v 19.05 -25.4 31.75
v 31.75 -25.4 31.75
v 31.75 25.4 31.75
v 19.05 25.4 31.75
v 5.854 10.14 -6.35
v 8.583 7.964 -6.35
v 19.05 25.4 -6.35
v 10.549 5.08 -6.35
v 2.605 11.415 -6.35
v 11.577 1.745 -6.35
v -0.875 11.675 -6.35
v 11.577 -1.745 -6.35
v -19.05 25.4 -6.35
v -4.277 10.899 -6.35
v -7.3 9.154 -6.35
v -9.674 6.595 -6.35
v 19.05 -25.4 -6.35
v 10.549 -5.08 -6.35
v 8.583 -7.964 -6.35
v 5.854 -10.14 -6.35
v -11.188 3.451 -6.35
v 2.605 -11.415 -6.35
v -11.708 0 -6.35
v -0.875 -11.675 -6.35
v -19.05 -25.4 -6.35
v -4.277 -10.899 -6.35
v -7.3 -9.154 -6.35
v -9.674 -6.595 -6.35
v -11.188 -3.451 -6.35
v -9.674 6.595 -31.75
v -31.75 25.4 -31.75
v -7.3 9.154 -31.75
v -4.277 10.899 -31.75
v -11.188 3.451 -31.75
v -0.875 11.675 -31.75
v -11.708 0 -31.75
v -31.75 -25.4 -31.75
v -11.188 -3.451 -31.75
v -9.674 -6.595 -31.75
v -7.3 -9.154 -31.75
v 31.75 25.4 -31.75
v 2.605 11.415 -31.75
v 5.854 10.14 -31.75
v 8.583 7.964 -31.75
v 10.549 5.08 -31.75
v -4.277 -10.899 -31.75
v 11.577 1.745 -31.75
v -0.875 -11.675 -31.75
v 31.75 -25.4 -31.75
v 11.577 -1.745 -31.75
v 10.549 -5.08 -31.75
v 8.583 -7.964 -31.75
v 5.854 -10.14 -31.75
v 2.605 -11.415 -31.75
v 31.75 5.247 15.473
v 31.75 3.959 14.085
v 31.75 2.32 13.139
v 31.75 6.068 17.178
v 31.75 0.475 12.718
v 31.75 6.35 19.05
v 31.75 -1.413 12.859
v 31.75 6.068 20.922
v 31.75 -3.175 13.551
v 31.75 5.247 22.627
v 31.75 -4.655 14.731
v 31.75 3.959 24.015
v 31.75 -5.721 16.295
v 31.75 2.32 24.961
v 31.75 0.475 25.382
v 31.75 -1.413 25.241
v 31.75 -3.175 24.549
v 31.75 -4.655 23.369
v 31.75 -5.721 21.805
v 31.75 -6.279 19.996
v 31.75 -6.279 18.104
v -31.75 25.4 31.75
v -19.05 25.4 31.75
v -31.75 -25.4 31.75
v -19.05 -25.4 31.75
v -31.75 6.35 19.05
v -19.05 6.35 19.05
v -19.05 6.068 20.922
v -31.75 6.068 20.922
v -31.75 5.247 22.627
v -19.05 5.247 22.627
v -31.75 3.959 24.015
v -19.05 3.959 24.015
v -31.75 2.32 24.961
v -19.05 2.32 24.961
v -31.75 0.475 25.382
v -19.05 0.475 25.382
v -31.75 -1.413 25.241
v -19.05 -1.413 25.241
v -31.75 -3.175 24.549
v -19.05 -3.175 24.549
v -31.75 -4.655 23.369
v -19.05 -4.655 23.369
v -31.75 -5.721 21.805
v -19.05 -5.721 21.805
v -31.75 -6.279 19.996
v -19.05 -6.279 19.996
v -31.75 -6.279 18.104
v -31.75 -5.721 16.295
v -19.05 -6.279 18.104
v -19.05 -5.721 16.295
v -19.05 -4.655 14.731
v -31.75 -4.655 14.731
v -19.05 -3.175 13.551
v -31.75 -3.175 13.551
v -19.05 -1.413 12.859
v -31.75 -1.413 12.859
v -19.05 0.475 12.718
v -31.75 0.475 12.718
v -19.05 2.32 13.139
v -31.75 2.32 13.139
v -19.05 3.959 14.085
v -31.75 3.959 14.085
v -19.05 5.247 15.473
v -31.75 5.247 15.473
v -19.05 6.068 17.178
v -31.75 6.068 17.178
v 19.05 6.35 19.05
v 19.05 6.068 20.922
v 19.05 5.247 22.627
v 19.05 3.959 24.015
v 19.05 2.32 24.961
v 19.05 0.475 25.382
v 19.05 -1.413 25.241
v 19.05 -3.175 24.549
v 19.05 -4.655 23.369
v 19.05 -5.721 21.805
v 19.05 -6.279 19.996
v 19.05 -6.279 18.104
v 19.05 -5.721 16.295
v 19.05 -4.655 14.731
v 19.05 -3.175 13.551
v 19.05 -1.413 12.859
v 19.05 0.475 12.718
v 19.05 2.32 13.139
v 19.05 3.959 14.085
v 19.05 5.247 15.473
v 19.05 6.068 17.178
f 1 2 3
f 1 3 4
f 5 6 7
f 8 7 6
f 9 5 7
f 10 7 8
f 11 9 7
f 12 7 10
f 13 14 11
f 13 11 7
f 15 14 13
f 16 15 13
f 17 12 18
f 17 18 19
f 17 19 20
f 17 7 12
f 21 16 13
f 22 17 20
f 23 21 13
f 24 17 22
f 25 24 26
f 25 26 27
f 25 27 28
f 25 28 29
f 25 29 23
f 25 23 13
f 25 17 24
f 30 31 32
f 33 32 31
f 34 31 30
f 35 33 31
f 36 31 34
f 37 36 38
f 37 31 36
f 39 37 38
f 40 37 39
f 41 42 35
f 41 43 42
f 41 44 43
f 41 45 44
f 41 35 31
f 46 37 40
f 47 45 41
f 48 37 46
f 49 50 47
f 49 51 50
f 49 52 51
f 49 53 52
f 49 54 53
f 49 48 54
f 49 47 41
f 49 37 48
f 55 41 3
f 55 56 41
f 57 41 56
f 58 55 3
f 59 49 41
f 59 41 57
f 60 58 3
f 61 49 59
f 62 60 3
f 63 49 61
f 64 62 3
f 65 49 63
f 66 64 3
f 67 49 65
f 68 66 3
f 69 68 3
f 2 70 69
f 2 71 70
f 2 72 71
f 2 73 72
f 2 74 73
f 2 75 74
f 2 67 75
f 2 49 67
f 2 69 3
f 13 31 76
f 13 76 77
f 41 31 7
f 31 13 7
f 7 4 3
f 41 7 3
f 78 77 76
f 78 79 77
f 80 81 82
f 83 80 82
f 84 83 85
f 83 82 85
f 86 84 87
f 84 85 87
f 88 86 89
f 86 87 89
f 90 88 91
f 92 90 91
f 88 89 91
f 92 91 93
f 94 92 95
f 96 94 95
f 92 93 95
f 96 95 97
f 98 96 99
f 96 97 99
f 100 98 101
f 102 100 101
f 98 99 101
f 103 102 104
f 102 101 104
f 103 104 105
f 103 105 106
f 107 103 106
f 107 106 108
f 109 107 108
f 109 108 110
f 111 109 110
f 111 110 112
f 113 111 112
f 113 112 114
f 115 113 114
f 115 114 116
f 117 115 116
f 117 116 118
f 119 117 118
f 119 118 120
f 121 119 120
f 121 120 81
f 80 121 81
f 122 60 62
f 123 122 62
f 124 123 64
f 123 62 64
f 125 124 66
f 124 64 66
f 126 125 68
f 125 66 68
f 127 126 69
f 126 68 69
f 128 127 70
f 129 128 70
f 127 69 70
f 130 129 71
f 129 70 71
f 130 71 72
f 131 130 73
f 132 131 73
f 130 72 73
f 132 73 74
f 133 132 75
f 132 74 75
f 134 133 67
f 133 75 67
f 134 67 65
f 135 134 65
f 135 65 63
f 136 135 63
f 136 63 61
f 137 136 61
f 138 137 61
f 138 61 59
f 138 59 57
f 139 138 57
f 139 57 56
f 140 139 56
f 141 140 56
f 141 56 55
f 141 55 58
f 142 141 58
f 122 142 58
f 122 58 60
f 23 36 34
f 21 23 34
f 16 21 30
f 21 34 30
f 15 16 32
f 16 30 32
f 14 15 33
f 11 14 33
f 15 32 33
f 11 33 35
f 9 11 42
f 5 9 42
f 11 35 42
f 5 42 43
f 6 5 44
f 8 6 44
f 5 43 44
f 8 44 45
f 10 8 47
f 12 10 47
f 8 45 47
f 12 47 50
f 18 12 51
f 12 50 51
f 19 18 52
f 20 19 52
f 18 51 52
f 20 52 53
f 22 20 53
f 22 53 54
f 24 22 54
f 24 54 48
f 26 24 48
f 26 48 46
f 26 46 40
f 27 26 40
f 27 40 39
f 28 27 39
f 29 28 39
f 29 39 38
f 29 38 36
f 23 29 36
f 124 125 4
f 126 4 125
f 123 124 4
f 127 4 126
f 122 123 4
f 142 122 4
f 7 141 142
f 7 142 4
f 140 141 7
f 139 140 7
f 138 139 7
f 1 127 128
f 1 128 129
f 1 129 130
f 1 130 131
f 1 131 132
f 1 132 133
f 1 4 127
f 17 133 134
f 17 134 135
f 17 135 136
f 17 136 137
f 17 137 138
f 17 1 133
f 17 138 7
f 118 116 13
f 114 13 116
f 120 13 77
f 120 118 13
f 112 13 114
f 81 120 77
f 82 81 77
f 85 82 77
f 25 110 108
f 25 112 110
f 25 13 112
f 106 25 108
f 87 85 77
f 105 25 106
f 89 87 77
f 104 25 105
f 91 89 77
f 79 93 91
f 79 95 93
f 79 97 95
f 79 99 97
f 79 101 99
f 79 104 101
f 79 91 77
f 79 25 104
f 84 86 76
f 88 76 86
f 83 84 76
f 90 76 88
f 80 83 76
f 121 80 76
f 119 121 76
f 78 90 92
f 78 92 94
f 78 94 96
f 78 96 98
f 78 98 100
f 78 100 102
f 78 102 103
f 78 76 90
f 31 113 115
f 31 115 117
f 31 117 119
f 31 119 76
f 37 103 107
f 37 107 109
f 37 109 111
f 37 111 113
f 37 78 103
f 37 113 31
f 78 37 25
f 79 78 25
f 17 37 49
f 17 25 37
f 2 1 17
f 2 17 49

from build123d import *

# Parameters (mm, degrees)
F1_DEPTH = 25.4
F3_D     = 12.7
F5_D     = 23.41626


with BuildPart() as f1:
    # F0 (on Front) → F1 (new body, symmetric)
    with BuildSketch(Plane.XZ):
        Polygon((-19.05, 31.75), (-31.75, 31.75), (-31.75, -31.75), (31.75, -31.75), (31.75, 31.75), (19.05, 31.75), (19.05, -6.35), (-19.05, -6.35), align=None)
    extrude(amount=F1_DEPTH, both=True)

    # F3 (through all)
    with Locations(Plane(origin=(-31.75, 0, 0), x_dir=(0, -1, 0), z_dir=(-1, 0, 0))):
        with Locations((0, 19.05)):
            Hole(F3_D / 2)

    # F5 (through all)
    with Locations(Plane.XY.offset(-6.35)):
        with Locations((0, 0)):
            Hole(F5_D / 2)


solid = f1.part
